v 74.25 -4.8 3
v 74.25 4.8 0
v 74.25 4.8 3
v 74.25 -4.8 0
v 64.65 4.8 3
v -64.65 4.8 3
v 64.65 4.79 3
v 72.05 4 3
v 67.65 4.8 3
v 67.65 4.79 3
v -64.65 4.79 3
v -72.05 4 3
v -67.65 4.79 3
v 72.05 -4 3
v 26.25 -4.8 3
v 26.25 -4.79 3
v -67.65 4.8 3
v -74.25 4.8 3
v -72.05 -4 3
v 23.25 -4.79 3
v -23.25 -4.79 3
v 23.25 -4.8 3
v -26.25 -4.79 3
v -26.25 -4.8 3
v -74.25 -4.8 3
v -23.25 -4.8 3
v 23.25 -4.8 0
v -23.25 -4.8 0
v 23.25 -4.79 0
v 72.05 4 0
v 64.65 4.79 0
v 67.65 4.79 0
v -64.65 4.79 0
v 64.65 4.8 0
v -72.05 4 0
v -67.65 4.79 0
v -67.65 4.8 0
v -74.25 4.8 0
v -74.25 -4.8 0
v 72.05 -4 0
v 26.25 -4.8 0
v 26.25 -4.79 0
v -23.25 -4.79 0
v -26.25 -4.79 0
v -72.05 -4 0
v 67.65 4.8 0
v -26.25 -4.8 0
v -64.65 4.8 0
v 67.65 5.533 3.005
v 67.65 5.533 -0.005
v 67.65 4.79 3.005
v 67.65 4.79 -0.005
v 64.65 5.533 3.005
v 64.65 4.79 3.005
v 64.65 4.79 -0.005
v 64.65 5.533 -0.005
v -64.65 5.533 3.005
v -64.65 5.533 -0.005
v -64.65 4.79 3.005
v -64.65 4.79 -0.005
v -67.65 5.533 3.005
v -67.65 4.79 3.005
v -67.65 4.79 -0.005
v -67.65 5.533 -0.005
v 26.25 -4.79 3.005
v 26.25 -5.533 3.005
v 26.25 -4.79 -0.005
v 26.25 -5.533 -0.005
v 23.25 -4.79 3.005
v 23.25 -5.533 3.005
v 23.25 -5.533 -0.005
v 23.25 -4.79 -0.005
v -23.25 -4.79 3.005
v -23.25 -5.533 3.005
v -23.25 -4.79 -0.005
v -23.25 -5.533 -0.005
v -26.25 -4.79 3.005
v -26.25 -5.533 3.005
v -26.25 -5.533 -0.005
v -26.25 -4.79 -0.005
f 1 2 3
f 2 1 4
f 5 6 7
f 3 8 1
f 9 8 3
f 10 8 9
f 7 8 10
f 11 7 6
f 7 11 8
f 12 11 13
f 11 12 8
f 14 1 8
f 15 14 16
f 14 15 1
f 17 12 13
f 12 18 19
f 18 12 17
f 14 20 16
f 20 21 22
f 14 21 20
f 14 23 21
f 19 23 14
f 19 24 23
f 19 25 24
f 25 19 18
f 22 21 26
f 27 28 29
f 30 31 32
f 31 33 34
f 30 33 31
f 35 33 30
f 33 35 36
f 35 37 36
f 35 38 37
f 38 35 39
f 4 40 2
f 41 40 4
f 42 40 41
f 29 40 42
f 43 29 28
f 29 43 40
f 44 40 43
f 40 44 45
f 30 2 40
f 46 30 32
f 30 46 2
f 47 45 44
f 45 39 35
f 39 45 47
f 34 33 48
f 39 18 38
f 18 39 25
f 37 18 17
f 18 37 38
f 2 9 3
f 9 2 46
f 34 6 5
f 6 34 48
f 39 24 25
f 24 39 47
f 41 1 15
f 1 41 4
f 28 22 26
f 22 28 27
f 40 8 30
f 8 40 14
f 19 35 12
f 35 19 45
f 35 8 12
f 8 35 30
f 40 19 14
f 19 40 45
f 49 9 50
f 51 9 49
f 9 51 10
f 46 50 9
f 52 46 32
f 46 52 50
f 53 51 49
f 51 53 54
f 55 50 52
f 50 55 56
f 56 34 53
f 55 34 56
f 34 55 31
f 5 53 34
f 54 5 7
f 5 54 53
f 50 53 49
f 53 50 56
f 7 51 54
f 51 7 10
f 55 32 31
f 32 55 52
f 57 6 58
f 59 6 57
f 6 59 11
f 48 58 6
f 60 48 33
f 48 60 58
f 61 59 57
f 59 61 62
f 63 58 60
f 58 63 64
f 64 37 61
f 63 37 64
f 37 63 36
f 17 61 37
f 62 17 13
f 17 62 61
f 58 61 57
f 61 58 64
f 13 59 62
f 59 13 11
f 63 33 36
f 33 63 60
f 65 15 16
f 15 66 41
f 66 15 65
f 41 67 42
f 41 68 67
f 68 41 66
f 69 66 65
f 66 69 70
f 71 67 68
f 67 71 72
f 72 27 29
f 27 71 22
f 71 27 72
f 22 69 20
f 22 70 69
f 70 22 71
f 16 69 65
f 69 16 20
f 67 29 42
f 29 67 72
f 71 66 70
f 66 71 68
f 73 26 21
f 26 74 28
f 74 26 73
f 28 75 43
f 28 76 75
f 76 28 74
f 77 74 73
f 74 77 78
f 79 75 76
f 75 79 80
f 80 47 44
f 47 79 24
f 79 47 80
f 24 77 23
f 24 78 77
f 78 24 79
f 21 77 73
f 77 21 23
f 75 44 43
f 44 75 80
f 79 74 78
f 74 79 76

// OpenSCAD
// -*- mode: SCAD ; c-file-style: "ellemtel" ; coding: utf-8 -*-
//
// Holder for Minox film strips
//
// A holder for Minox 11 picture film strips for use with generic flatbed
// scanners with a transparency unit and holder for 135 (35 mm) film.
//
// © 2018 Roland Sieker <ospalh@gmail.com>
// Licence: CC-BY-SA 4.0


// … to preview. You will get all parts when you click “Create Thing”.
part = "Klemme"; // [Halter: Halter, Klemme: Klemme]

// Set this to “render” and click on “Create Thing” when done with the setup.
preview = 1; // [0:render, 1:preview]
// I put this in every design, but it shouldn’t make a difference on this one.

w_loch = 24.6;
// w_streifen = 9.2;  // real width
w_streifen = 9.6;  // slightly more so the movable part becomes more stable
w_bild = 8;
l_bild = 13.1;
bilder_ps = 11;


p_h = 1;
p_k = 3;

/* [Hidden] */

// Done with the customizer

// *******************************************************
// Extra parameters. These can be changed reasonably safely.


// w = 1.8;  // Wall width
// p = 1.2;  // Bottom, top plate height
c = 0.4;  // Clearance
c_x = 1.2;
angle = 60; // Overhangs much below 60° are a problem for me

// *******************************************************
// Some shortcuts. These shouldn’t be changed

tau = 2 * PI;  // π is still wrong. τ = ⌀ ÷ r

xy_factor = 1/tan(angle);
// To get from a height to a horizontal width inclined correctly
z_factor = tan(angle);  // The other way around

w_halter = w_loch - c;
w_k = w_streifen + c;
w_nut = w_k + c;
w_steg = (w_halter - 2 * w_nut) / 3;
w_x = 1.8;
b_nase = 3;
b_nnut = b_nase + c_x;
l_streifen = l_bild * bilder_ps;
l_loch_k = l_streifen + c;
l_loch_h = l_loch_k + c;
l_k = l_loch_k + 2 * w_x + c;
l_halter = l_k  + c + 2 * w_x;
w_loch_h = w_bild + c;
h_halter = p_h + p_k;

y_nut = w_steg/2 + w_nut/2;

xo_o = l_k/2 - w_x - 1.5 * b_nnut;
xo_u = l_k/6;

some_distance = 0.6 * w_halter + 0.6 * w_streifen + w_steg;
ms = 0.01;  // Muggeseggele.

// fn for differently sized objects and fs, fa; all for preview or rendering.
pna = 40;
pnb = 15;
pa = 5;
ps = 1;
rna = 180;
rnb = 30;
ra = 1;
rs = 0.1;
function na() = (preview) ? pna : rna;
function nb() = (preview) ? pnb : rnb;
$fs = (preview) ? ps : rs;
$fa = (preview) ? pa : ra;

// *******************************************************
// End setup



// *******************************************************
// Generate the parts

print_part();
// preview_parts();
// stack_parts();

module print_part()
{
   if ("Halter" == part)
   {
      halter();
   }
   if ("Klemme" == part)
   {
      klemme();
   }
}

module preview_parts()
{
   halter();
   translate([0, some_distance, 0])
   {
      klemme();
   }
}

module stack_parts()
{
   // intersection()
   {
      color("yellow")
      {
         halter();
      }
      union()
      {
         translate([0, -y_nut, p_h+ms])
         {
            color("red")
            {
               klemme();
            }
         }
         translate([0, y_nut, p_h+ms])
         {
            color("red")
            {
               klemme();
            }
         }
      }
   }
}

// *******************************************************
// Code for the parts themselves


module halter()
{
   difference()
   {
      translate([0, 0, h_halter/2])
      {
         cube([l_halter, w_halter, h_halter], center=true);
      }
      filmloch_halter(true);
      filmloch_halter(false);
   }
}

module filmloch_halter(ot)
{
   yo = ot ? y_nut : -y_nut;
   translate([0, yo, 0])
   {
      cube([l_loch_h, w_loch_h, 2*h_halter+2*ms], center=true);
      translate([0,0, p_h+p_k/2+ms])
      {
         cube([l_halter+2*ms, w_nut, p_k+2*ms], center=true);
      }
      vier_nn(true);
   }
}

module eine_nn(xo, ot, nutnase)
{
   w_nn = nutnase ? b_nnut : b_nase;
   y_nn = nutnase ? w_steg + 2*ms : w_steg - c + ms;
   w_b = nutnase ? w_nut : w_streifen;
   yo = w_b/2 + y_nn/2 - ms;
   yot = ot ? yo : -yo;
   zo = nutnase ? p_h + ms : 0;
   translate([xo, yot, zo+p_k/2])
   {
      cube([w_nn, y_nn, p_k+ms], center=true);
   }
}

module vier_nn(nutnase)
{
   eine_nn(xo_o, true, nutnase);
   eine_nn(-xo_o, true, nutnase);
   eine_nn(xo_u, false, nutnase);
   eine_nn(-xo_u, false, nutnase);
}

module klemme()
{
   difference()
   {
      translate([0,0, p_k/2])
      {
         cube([l_k, w_streifen, p_k], center=true);
      }
      cube([l_streifen, w_bild, 3*p_k], center=true);
   }
   vier_nn(false);
}
